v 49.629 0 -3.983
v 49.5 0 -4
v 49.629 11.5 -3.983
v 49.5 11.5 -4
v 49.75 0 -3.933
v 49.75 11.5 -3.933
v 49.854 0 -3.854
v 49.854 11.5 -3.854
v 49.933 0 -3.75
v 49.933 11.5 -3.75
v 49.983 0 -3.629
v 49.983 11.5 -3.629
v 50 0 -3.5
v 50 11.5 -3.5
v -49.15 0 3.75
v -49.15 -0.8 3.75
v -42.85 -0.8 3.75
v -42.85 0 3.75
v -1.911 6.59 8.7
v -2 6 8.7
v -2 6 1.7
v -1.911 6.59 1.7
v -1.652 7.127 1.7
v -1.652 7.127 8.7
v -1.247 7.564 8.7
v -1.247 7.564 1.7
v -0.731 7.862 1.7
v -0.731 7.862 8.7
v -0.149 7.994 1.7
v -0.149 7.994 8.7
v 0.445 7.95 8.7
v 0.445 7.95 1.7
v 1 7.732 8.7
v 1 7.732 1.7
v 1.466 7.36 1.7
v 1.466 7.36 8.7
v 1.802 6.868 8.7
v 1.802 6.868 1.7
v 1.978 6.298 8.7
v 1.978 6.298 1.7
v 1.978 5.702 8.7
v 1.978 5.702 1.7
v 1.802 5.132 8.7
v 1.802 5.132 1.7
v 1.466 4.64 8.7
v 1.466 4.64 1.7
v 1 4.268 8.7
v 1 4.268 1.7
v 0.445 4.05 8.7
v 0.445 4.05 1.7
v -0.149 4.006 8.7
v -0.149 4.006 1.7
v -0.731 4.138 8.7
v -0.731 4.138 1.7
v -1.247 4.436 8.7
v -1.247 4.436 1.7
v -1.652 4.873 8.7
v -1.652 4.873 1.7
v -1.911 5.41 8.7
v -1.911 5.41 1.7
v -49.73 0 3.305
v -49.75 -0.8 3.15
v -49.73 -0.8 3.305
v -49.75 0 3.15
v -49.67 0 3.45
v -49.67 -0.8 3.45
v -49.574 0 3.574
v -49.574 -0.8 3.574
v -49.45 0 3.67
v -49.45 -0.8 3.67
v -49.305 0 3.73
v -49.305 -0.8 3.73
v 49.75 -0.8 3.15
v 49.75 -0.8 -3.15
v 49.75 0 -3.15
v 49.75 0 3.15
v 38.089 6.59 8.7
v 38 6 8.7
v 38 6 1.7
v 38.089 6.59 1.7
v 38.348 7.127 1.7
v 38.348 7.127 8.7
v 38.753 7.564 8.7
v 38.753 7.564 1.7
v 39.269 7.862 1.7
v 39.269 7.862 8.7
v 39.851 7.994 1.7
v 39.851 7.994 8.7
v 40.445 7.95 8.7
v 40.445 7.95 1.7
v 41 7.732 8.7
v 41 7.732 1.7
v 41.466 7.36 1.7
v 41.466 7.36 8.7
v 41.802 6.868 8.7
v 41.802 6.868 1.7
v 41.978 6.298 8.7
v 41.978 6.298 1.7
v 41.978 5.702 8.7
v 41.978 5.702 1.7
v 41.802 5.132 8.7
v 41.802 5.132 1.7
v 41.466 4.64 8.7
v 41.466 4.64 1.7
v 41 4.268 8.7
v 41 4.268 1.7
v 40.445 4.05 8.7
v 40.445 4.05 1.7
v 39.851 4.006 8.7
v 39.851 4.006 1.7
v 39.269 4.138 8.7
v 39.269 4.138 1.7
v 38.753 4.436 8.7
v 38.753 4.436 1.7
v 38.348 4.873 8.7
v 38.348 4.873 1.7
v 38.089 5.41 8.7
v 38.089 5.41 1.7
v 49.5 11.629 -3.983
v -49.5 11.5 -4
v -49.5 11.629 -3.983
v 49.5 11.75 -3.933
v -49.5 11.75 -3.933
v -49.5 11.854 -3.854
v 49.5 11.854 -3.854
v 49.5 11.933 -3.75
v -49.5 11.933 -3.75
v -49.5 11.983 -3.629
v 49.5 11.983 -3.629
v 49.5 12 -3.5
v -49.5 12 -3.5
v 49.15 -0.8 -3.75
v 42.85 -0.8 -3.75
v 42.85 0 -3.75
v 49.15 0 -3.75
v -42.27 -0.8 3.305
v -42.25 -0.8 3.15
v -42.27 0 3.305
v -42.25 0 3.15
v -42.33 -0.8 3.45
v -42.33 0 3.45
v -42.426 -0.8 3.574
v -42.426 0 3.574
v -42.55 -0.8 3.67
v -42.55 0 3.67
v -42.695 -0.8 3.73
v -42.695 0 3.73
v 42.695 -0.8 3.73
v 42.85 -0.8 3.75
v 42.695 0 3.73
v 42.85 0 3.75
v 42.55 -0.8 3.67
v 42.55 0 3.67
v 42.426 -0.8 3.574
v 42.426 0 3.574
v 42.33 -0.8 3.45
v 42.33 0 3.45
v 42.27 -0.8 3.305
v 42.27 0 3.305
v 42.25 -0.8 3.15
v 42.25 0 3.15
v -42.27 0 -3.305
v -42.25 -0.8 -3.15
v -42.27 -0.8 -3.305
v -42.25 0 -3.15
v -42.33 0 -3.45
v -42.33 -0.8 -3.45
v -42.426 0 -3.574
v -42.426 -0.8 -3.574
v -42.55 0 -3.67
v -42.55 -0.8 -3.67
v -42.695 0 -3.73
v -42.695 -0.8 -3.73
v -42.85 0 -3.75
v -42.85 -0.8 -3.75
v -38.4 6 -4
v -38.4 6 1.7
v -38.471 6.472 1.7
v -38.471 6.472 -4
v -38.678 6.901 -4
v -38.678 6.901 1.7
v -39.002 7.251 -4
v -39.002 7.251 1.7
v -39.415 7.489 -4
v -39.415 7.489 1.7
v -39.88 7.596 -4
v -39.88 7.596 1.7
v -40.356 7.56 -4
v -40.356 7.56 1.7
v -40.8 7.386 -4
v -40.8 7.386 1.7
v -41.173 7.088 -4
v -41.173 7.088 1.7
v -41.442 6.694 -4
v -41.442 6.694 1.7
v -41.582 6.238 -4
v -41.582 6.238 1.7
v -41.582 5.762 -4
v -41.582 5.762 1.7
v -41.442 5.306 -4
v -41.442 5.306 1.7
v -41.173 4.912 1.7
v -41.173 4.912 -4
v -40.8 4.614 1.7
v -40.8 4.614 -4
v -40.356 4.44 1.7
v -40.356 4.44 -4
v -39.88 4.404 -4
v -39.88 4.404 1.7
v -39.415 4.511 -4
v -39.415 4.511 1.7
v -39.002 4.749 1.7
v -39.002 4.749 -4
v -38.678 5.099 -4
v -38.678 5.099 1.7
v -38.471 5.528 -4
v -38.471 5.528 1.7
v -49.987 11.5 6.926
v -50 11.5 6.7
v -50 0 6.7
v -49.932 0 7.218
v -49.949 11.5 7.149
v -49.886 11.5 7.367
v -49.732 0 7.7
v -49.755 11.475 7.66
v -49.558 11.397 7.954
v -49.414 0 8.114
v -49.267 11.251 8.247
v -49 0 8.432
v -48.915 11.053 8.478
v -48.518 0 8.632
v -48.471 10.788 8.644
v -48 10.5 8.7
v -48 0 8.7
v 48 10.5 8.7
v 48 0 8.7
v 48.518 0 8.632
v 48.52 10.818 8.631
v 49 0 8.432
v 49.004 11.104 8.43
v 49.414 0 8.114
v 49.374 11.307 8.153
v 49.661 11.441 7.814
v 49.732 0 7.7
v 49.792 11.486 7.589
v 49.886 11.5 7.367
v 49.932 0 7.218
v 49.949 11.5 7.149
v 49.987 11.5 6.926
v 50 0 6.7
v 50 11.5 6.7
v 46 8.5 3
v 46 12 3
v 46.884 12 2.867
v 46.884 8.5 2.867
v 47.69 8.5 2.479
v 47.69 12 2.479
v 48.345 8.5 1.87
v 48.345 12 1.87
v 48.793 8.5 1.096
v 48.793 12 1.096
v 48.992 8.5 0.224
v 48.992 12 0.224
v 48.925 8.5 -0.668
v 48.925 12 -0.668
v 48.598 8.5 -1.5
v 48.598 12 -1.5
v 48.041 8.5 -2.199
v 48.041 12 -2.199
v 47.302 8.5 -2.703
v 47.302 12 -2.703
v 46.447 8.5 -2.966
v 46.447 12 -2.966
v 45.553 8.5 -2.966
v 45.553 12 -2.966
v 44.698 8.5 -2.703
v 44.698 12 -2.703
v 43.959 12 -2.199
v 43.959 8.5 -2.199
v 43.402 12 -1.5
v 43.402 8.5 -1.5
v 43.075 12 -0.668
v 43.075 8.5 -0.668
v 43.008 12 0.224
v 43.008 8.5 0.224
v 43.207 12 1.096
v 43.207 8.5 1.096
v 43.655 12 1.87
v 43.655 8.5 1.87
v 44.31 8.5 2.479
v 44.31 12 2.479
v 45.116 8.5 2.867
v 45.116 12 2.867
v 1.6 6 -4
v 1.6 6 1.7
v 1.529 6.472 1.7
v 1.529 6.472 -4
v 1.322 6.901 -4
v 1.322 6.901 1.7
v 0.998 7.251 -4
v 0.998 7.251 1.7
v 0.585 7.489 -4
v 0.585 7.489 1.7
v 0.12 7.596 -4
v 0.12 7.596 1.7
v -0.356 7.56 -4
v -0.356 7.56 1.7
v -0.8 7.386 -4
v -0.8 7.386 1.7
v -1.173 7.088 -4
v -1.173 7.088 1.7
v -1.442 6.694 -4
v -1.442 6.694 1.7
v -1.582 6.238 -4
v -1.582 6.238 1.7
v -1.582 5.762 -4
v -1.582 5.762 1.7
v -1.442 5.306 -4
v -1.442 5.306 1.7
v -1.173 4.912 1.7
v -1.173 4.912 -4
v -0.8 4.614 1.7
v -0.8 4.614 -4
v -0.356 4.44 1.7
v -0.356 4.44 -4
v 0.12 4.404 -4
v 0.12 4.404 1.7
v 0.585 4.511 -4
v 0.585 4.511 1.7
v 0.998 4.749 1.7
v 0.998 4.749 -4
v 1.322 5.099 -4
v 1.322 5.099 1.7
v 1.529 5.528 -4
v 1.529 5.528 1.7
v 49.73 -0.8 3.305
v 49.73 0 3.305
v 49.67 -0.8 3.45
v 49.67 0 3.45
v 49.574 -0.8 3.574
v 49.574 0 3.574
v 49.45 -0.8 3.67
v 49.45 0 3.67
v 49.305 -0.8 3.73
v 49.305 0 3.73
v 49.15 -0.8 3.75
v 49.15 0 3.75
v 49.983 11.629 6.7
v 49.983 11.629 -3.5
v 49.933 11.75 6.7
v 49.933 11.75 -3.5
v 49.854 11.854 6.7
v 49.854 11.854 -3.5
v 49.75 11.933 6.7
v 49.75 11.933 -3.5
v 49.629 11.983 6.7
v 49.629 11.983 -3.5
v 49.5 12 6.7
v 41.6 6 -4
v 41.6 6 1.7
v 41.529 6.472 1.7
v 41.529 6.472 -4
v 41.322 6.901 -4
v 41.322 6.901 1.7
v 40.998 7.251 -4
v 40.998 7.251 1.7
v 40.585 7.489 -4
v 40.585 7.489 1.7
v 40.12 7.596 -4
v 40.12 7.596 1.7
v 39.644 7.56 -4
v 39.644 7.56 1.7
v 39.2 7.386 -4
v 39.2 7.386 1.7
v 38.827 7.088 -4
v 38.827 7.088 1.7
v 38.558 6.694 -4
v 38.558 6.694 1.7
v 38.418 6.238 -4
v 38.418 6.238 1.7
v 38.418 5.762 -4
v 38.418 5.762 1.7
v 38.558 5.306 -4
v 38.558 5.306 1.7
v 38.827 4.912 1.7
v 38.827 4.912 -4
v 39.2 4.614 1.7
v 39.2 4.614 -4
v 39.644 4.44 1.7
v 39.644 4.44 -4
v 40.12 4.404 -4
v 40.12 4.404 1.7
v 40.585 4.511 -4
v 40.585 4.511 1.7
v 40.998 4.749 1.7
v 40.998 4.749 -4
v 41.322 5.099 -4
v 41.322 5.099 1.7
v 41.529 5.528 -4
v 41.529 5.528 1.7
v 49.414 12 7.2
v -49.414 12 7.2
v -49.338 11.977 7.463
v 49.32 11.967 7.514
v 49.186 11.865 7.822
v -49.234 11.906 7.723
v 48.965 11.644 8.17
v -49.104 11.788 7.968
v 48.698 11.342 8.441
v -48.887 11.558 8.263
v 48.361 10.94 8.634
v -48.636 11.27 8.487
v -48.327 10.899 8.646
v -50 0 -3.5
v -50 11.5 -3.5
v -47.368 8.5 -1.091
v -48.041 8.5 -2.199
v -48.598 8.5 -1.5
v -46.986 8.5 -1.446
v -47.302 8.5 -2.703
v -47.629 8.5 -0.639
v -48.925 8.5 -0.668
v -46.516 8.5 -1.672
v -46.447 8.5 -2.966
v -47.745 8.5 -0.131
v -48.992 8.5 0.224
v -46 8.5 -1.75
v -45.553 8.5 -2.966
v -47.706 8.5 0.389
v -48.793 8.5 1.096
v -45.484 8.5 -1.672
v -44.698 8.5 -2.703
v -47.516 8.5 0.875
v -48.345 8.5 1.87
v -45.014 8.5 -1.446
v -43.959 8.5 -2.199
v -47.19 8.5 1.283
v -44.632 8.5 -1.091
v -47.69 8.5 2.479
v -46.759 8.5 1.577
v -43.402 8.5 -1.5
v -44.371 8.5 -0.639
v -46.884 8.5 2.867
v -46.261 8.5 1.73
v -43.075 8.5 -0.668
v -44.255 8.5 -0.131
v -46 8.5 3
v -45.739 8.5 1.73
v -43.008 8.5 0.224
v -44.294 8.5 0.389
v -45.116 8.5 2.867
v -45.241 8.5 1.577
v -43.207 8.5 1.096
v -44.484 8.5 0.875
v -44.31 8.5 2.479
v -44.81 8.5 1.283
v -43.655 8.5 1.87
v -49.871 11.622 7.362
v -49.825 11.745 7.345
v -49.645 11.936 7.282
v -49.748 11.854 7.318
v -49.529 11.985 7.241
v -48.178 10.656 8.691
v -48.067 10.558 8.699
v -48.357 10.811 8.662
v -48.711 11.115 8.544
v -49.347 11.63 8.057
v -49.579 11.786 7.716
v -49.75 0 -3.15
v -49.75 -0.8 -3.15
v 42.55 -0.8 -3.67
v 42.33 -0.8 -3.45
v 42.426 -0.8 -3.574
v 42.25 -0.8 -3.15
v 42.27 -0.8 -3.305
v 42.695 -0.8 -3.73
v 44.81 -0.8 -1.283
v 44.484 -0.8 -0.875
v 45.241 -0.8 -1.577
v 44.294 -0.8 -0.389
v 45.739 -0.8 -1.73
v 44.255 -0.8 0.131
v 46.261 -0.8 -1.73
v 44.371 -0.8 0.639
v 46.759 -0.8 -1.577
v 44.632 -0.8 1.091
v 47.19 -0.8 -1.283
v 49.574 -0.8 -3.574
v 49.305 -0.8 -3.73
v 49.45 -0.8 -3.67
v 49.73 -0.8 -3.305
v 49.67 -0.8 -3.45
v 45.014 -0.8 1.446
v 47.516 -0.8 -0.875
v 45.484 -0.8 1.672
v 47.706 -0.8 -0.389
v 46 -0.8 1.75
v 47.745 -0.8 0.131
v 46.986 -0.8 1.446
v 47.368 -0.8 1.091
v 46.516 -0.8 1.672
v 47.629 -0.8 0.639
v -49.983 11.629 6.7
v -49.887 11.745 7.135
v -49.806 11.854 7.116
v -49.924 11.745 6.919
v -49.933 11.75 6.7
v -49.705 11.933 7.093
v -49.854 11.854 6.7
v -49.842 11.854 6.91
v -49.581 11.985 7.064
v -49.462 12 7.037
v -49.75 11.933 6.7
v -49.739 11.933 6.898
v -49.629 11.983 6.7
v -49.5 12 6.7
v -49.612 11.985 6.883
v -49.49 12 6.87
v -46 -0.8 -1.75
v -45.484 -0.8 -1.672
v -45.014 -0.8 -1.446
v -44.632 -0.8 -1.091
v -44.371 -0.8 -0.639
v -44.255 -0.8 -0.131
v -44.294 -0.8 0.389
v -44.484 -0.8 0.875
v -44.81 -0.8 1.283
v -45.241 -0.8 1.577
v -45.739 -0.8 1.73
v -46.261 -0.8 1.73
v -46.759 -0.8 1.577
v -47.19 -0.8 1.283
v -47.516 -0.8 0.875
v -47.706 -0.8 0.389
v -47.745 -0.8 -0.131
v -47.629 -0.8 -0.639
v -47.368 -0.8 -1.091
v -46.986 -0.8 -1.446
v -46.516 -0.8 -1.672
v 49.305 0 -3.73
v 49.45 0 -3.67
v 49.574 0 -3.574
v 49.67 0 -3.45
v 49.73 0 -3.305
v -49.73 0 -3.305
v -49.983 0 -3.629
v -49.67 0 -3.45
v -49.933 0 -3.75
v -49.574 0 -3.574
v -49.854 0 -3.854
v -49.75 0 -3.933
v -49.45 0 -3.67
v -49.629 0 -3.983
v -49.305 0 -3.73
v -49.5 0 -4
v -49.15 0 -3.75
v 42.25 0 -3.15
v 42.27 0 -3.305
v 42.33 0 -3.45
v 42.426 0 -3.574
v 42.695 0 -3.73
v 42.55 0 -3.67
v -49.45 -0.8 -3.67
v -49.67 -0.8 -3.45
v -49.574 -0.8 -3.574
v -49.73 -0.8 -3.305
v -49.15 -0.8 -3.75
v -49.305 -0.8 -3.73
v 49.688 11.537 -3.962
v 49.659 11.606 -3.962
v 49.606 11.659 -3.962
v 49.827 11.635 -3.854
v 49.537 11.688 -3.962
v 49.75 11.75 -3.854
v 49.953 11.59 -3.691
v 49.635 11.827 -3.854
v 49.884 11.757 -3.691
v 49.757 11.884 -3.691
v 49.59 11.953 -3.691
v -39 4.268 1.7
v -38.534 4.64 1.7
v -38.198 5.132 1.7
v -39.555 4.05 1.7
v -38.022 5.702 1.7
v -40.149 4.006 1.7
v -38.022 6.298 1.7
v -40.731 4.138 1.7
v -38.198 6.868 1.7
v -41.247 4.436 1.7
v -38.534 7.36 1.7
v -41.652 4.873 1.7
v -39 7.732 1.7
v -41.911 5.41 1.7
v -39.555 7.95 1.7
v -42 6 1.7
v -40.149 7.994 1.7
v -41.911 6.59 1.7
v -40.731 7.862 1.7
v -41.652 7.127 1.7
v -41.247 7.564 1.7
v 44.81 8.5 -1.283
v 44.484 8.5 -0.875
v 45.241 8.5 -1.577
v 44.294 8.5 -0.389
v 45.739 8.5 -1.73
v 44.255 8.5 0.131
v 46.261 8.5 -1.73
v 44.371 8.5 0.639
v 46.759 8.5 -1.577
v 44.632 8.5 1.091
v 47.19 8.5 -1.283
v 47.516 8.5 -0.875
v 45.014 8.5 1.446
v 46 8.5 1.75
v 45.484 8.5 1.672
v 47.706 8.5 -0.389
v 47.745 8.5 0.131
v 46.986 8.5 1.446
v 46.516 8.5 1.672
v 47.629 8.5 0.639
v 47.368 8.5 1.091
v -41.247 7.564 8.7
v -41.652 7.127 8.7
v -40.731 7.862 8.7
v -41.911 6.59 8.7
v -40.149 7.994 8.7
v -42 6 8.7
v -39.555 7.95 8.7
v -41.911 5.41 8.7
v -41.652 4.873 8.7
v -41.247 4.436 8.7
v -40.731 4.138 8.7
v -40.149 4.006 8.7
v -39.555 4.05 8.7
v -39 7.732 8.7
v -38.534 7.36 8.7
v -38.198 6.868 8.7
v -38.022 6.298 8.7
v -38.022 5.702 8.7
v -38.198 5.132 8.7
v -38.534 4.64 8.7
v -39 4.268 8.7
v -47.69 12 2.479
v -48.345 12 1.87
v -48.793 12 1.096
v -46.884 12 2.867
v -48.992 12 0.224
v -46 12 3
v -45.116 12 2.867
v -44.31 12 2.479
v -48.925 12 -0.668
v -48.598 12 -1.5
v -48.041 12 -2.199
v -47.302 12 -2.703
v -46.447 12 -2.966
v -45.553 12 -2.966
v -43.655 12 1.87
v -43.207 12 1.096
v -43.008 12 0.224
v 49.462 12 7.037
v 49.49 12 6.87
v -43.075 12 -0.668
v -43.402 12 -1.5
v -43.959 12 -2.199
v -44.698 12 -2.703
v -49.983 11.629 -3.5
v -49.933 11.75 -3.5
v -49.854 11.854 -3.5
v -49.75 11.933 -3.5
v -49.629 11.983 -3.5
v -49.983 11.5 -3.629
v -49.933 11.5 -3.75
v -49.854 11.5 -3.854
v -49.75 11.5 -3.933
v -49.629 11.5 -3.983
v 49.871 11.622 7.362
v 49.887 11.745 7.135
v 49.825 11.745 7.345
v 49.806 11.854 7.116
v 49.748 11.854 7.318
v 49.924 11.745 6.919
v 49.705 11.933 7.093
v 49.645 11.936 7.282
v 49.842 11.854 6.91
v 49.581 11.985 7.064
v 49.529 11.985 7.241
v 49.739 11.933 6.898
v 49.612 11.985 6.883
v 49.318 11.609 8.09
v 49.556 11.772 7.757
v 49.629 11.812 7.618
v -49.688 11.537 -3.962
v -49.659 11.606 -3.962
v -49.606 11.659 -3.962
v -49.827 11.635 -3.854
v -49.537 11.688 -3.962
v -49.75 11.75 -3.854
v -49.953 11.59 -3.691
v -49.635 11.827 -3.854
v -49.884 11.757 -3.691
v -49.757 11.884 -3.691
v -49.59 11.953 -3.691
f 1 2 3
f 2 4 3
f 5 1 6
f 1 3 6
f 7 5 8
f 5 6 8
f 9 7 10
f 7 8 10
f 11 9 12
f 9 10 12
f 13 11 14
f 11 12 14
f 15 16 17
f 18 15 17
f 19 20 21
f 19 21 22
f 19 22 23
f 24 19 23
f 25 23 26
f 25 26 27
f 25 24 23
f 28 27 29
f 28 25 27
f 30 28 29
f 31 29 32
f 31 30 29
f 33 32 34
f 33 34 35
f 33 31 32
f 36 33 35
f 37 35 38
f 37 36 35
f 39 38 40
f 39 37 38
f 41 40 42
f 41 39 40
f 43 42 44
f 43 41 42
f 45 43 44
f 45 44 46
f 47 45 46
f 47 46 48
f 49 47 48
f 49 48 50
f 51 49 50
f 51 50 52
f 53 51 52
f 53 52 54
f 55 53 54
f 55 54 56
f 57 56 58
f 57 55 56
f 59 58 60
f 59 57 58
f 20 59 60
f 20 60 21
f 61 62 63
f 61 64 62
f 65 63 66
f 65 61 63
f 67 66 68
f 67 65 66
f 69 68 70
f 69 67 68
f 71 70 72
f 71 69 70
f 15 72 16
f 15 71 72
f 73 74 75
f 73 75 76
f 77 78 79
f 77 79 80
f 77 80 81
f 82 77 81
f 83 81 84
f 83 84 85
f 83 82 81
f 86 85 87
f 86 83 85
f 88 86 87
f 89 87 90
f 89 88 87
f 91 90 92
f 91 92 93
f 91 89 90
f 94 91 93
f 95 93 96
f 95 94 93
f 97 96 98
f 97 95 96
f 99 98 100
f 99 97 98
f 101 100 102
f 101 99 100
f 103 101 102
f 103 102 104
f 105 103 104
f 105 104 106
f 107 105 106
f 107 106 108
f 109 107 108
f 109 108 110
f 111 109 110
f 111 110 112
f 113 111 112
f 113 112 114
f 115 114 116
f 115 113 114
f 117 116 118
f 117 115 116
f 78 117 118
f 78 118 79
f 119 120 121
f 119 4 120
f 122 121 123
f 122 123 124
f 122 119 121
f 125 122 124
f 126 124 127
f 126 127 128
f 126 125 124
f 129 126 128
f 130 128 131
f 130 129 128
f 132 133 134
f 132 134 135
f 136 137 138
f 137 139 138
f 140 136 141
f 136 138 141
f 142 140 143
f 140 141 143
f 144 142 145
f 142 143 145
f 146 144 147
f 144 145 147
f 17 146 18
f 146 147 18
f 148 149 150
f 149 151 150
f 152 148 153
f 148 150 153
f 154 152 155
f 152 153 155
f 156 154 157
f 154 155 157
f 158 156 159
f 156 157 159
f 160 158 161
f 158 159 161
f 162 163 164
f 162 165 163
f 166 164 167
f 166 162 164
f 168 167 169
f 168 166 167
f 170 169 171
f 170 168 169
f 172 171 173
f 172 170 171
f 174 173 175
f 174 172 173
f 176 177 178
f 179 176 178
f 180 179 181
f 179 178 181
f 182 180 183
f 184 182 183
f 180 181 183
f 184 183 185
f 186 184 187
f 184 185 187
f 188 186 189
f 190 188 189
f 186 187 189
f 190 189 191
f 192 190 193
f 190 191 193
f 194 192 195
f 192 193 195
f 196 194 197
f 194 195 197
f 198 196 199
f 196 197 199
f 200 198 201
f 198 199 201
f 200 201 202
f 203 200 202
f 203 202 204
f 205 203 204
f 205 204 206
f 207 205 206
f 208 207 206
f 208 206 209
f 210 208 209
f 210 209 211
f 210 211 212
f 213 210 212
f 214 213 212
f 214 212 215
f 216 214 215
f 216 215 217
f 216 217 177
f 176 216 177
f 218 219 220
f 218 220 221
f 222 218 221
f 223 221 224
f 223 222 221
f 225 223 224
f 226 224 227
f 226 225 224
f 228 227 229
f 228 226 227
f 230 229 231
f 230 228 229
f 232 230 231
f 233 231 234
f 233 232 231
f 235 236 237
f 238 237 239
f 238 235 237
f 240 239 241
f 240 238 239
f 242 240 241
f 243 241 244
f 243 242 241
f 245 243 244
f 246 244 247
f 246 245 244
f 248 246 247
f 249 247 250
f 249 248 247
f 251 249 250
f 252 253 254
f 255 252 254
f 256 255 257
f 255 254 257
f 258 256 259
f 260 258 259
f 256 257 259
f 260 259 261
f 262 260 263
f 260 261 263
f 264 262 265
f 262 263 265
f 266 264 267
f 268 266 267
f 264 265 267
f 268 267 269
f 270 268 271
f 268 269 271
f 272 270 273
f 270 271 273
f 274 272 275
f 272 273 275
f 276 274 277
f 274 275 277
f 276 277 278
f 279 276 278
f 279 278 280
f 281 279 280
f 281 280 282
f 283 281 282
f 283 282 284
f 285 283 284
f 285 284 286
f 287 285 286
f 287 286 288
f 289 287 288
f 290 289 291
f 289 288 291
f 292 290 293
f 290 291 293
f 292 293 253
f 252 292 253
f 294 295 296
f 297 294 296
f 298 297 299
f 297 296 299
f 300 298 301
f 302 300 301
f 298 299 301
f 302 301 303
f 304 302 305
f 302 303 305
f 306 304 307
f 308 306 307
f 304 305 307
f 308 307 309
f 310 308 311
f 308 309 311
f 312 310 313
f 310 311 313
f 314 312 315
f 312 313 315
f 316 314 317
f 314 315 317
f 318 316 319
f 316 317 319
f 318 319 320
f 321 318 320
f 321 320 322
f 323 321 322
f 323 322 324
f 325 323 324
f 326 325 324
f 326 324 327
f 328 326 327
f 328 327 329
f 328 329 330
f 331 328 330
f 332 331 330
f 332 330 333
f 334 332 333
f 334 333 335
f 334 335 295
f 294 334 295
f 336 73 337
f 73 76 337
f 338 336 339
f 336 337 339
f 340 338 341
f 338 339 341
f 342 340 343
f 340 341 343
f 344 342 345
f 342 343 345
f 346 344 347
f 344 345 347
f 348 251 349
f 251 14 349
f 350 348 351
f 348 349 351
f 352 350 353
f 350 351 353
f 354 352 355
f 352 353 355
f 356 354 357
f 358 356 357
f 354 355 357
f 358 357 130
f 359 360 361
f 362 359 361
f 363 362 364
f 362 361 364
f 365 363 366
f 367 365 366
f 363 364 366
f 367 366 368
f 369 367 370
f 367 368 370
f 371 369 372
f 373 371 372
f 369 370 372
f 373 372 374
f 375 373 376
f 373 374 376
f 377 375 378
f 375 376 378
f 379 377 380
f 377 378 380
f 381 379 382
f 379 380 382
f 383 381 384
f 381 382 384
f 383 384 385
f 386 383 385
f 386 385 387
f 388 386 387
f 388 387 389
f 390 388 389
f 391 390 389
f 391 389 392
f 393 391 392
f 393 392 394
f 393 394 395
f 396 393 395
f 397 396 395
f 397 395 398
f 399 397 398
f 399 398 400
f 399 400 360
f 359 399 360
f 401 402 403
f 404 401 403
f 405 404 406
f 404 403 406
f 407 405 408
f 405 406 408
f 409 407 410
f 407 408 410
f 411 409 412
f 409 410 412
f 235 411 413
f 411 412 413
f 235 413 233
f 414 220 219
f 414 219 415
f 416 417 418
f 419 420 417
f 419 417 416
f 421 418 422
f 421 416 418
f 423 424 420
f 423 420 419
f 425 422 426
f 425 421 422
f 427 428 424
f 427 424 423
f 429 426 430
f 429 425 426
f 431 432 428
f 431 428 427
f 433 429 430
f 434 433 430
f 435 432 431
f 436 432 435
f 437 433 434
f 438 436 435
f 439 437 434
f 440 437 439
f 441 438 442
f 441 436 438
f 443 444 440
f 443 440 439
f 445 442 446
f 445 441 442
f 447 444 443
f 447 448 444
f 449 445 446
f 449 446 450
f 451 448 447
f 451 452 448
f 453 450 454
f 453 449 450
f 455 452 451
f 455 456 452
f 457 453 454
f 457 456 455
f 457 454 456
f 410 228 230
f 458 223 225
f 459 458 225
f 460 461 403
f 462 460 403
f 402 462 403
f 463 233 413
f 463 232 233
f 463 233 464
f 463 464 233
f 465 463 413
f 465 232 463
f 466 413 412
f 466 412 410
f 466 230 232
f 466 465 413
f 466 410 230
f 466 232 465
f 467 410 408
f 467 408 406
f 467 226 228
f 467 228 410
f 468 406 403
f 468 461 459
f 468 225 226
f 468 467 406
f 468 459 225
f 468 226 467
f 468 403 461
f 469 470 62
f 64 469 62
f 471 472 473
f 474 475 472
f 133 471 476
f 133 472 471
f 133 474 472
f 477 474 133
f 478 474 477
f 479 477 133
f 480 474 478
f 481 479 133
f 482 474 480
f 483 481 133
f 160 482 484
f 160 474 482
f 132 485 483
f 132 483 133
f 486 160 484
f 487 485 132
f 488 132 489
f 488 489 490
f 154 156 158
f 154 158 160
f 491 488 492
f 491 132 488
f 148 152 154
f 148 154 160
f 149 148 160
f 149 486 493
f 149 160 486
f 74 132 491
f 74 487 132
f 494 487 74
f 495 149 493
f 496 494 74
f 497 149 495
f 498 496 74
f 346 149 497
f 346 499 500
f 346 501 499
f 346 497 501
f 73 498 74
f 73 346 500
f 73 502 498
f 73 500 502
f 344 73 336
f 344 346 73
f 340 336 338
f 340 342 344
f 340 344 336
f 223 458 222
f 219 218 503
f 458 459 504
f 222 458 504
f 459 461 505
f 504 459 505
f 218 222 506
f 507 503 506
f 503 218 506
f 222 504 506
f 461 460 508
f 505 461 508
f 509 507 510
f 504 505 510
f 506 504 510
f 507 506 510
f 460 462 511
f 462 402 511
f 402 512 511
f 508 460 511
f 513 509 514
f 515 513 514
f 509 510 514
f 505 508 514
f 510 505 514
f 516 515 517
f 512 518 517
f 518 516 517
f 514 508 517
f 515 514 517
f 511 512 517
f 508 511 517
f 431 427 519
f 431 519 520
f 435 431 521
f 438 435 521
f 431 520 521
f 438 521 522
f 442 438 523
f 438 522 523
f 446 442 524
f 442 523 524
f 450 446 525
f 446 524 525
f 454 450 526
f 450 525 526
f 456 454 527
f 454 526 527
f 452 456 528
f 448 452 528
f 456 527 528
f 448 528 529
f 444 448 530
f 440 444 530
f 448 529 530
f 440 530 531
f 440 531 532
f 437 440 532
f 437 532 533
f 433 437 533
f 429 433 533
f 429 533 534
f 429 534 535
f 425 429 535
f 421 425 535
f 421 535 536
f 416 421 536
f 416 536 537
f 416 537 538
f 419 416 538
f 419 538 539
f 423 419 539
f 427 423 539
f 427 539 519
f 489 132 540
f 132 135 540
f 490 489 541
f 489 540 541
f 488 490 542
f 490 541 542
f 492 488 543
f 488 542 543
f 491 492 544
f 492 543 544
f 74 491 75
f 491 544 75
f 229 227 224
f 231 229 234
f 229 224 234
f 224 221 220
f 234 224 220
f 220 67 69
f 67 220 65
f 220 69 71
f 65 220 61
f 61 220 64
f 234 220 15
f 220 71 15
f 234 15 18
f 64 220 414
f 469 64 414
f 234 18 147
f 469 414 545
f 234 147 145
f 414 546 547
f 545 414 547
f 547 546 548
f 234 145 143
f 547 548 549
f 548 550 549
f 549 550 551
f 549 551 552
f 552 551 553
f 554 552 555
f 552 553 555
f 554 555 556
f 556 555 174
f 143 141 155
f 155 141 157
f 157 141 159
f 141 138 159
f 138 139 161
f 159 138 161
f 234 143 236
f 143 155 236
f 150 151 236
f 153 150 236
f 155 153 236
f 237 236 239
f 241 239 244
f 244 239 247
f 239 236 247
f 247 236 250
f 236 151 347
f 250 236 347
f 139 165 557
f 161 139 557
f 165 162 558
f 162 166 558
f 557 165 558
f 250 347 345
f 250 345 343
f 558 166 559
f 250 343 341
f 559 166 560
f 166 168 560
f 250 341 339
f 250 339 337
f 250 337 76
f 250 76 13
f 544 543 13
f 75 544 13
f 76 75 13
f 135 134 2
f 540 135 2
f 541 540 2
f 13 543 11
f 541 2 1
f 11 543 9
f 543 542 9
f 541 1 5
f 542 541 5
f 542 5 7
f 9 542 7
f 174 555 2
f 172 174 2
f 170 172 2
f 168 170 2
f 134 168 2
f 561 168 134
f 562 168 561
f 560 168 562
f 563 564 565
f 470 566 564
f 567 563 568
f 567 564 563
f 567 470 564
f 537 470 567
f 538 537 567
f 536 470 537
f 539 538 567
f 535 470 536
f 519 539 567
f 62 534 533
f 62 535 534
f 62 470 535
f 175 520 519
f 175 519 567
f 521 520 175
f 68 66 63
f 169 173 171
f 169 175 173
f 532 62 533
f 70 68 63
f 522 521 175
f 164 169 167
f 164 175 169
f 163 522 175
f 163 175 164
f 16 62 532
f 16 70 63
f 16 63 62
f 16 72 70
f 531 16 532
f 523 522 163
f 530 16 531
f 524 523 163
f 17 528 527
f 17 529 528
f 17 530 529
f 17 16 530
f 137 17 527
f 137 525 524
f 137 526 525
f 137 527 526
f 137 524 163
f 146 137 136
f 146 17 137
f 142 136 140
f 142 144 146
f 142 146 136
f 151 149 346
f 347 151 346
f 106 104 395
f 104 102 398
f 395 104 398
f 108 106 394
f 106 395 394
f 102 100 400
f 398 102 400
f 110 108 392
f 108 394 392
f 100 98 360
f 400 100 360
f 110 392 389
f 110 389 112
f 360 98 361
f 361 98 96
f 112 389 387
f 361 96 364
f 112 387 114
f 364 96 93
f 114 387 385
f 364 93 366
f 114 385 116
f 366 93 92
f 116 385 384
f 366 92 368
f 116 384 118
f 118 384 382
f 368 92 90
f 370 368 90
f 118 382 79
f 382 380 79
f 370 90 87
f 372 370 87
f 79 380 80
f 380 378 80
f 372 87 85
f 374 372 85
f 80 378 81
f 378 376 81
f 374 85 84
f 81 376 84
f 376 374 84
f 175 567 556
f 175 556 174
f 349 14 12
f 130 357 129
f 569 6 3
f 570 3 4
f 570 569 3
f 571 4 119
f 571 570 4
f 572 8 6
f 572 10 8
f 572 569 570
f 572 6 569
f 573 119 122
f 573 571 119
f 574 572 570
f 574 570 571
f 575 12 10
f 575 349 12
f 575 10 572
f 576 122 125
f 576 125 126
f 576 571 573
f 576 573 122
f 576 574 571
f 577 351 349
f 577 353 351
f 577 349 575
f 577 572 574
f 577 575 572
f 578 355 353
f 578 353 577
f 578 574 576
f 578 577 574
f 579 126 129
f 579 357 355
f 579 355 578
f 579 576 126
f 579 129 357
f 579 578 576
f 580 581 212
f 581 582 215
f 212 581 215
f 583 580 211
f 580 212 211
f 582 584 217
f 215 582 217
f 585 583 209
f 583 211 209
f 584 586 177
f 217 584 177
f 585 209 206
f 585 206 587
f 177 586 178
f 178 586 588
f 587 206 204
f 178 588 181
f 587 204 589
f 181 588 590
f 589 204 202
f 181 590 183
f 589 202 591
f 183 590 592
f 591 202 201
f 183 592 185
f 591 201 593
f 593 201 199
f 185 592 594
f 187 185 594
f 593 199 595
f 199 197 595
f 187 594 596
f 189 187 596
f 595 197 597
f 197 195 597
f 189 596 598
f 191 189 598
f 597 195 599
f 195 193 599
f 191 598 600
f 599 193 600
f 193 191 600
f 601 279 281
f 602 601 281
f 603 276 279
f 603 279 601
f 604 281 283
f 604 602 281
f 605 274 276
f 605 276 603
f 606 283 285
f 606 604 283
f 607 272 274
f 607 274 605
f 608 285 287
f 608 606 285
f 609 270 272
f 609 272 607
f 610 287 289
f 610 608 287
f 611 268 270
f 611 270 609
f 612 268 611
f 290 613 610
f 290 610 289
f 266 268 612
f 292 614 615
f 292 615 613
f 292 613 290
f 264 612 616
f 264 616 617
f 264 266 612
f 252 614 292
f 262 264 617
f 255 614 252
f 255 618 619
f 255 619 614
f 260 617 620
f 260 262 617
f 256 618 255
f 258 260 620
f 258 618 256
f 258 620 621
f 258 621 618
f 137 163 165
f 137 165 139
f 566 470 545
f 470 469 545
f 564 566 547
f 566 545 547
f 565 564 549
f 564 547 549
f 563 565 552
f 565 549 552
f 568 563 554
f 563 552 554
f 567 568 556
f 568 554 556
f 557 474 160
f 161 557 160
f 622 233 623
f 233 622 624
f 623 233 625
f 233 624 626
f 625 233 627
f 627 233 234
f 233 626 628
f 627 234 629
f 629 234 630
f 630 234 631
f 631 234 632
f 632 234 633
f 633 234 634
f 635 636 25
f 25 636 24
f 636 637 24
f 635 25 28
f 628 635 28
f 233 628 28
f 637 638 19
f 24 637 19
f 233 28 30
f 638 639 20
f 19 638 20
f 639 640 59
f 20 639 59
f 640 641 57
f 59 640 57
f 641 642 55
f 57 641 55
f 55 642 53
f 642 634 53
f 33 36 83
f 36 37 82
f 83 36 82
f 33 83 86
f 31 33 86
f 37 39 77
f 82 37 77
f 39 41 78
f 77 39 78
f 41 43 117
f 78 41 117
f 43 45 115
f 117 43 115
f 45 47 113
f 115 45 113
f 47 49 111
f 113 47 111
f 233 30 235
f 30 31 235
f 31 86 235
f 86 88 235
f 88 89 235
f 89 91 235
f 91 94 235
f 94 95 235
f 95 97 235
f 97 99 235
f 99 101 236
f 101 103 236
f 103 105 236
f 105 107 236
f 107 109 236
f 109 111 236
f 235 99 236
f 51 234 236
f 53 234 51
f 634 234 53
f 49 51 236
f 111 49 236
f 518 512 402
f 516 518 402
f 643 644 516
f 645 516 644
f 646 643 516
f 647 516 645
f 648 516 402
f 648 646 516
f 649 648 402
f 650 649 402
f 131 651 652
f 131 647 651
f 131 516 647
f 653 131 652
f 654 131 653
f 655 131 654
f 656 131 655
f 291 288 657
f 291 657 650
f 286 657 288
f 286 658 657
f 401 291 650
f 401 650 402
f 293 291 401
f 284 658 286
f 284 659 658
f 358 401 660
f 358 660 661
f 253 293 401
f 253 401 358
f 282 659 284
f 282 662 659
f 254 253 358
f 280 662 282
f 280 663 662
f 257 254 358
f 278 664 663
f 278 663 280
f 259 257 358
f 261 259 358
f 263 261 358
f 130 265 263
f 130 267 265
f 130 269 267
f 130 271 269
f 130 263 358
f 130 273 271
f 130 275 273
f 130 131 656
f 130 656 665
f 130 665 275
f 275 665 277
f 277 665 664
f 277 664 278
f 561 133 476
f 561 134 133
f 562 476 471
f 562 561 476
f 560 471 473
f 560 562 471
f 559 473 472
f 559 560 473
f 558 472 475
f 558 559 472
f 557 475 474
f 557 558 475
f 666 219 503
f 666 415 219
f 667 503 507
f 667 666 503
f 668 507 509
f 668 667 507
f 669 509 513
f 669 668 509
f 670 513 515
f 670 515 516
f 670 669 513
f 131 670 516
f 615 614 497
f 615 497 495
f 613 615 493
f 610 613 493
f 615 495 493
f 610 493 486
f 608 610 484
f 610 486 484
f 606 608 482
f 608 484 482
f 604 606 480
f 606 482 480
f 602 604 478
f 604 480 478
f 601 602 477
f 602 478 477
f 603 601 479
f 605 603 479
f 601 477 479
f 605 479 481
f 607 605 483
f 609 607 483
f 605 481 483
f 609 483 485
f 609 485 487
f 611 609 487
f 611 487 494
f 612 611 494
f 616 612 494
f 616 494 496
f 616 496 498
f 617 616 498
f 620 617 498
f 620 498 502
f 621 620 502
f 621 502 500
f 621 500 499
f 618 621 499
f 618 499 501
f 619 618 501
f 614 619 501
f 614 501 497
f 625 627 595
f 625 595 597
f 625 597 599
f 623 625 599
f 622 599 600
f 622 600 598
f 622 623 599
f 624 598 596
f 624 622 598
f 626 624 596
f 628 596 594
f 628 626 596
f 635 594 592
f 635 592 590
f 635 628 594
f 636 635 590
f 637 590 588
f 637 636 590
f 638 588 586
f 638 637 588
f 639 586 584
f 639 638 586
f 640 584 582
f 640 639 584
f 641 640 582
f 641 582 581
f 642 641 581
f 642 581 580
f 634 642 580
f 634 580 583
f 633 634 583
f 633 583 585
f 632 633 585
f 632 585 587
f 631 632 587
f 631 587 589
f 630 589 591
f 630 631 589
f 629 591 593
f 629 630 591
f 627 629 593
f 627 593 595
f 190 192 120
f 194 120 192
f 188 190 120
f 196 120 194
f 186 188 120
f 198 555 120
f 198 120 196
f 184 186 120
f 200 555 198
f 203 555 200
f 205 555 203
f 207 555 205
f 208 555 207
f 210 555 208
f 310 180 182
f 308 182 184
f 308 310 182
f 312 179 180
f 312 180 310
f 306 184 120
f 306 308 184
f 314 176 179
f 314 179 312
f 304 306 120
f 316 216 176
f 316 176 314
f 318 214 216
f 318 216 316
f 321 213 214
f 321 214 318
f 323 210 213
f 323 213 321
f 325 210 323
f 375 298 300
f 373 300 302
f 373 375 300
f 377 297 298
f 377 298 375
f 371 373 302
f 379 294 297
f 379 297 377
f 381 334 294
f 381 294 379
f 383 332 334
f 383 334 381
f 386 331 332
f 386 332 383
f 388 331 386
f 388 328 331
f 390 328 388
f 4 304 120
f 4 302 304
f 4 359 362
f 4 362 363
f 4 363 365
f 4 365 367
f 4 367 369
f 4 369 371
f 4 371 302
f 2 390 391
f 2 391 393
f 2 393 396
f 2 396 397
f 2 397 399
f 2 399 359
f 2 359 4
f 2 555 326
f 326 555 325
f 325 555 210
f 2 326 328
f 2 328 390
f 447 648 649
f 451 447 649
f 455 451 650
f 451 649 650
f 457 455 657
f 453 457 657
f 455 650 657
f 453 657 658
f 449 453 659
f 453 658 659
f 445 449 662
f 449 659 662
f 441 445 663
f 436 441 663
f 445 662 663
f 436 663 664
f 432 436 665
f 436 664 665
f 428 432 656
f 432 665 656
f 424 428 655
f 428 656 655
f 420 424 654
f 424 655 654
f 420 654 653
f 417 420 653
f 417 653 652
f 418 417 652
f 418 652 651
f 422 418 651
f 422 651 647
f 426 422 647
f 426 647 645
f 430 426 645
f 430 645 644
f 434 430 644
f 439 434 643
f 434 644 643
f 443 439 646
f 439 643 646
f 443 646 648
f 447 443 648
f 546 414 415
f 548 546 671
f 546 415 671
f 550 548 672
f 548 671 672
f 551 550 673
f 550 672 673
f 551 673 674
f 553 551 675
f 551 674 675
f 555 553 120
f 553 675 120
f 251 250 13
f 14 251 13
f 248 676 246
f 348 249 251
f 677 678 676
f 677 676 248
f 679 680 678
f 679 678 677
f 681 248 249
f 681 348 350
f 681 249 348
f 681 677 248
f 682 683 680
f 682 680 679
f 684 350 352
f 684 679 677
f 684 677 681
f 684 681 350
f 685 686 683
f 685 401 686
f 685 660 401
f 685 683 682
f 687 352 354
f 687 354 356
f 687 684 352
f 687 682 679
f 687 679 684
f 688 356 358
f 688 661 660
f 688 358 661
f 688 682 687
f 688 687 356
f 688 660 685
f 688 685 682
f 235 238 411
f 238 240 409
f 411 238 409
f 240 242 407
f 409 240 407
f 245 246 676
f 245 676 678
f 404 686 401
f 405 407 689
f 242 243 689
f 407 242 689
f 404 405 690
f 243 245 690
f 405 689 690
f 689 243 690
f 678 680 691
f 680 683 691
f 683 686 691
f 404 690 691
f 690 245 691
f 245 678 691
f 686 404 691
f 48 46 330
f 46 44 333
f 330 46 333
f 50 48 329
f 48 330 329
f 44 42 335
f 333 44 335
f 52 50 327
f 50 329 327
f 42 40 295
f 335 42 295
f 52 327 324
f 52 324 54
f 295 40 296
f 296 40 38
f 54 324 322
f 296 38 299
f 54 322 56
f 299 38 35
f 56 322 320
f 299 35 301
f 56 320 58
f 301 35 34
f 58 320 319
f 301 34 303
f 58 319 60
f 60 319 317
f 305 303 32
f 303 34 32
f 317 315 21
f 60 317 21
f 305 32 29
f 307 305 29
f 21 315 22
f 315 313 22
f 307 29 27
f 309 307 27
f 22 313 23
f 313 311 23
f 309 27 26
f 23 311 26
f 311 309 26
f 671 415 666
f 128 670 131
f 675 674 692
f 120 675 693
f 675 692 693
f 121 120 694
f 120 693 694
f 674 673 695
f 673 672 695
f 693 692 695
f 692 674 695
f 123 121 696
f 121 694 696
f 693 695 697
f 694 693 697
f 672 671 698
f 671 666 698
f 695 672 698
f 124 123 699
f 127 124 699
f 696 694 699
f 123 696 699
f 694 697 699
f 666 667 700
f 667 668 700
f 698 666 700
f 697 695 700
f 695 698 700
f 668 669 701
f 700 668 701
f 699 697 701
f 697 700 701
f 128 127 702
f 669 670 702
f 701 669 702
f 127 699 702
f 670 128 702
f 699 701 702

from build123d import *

# Parameters (mm, degrees)
SKETCH1_W           = 100
SKETCH1_H           = 12.7
SKETCH1_R           = 1.75
BOSS_EXTRUDE1_DEPTH = 12
SKETCH2_R           = 3
CUT_EXTRUDE1_DEPTH  = 3.5
SKETCH3_R           = 1.6
CUT_EXTRUDE2_DEPTH  = 50
SKETCH4_R           = 2
CUT_EXTRUDE3_DEPTH  = 7
FILLET1_R           = 2
FILLET2_R           = 1.5
BOSS_EXTRUDE2_START = 0.8
SKETCH5_W           = 7.5
SKETCH5_H           = 7.5
SKETCH5_R           = 1.75
BOSS_EXTRUDE2_DEPTH = 0.8
FILLET3_R           = 0.6
FILLET4_R           = 0.5


with BuildPart() as part:
    # Sketch1 → Boss-Extrude1 (new body)
    with BuildSketch(Plane(origin=(0, 0, 0), x_dir=(1, 0, 0), z_dir=(0, 1, 0))):
        with Locations((0, -2.35)):
            Rectangle(SKETCH1_W, SKETCH1_H)
        with Locations(Location((46, 0, 0), (0, 0, 270))):
            Circle(SKETCH1_R, mode=Mode.SUBTRACT)
        with Locations(Location((-46, 0, 0), (0, 0, 90))):
            Circle(SKETCH1_R, mode=Mode.SUBTRACT)
    extrude(amount=BOSS_EXTRUDE1_DEPTH)

    # Sketch2 → Cut-Extrude1 (cut)
    with BuildSketch(Plane(origin=(0, 12, 0), x_dir=(1, 0, 0), z_dir=(0, 1, 0))):
        with Locations(Location((46, 0, 0), (0, 0, 270))):
            Circle(SKETCH2_R)
        with Locations(Location((-46, 0, 0), (0, 0, 270))):
            Circle(SKETCH2_R)
    extrude(amount=-CUT_EXTRUDE1_DEPTH, mode=Mode.SUBTRACT)

    # Sketch3 → Cut-Extrude2 (cut)
    with BuildSketch(Plane.XY.offset(8.7)):
        with Locations((40, 6)):
            Circle(SKETCH3_R)
        with Locations((0, 6)):
            Circle(SKETCH3_R)
        with Locations((-40, 6)):
            Circle(SKETCH3_R)
    extrude(amount=-CUT_EXTRUDE2_DEPTH, mode=Mode.SUBTRACT)

    # Sketch4 → Cut-Extrude3 (cut)
    with BuildSketch(Plane(origin=(0, 0, 8.7), x_dir=(-1, 0, 0), z_dir=(0, 0, -1))):
        with Locations((40, 6)):
            Circle(SKETCH4_R)
        with Locations((0, 6)):
            Circle(SKETCH4_R)
        with Locations((-40, 6)):
            Circle(SKETCH4_R)
    extrude(amount=CUT_EXTRUDE3_DEPTH, mode=Mode.SUBTRACT)

    # Fillet1
    fillet1_edges = [part.edges().sort_by_distance(p)[0] for p in [
        (50, 6, 8.7),
        (-50, 6, 8.7),
    ]]
    fillet(fillet1_edges, radius=FILLET1_R)

    # Fillet2
    # the kernel refuses this fillet: 1.5 mm, written as the material it takes off along each edge
    with BuildSketch(Plane(origin=(-51.75, 12, 8.7), x_dir=(0, -1, 0), z_dir=(1, 0, 0))) as fillet2_piece_1:
        with BuildLine():
            CenterArc((FILLET2_R, FILLET2_R), FILLET2_R, 180, 90)
            Line((0, FILLET2_R), (0, 0))
            Line((0, 0), (FILLET2_R, 0))
        make_face()
    extrude(amount=103.5, mode=Mode.SUBTRACT)

    # Sketch5 → Boss-Extrude2 (add)
    # profile 1 of 2: a face of its own
    with BuildSketch(Plane.XZ.offset(BOSS_EXTRUDE2_START)):
        with Locations((-46, 0)):
            Rectangle(SKETCH5_W, SKETCH5_H)
        with Locations(Location((-46, 0, 0), (0, 0, 270))):
            Circle(SKETCH5_R, mode=Mode.SUBTRACT)
    # profile 2 of 2: a face of its own
    with BuildSketch(Plane.XZ.offset(BOSS_EXTRUDE2_START)):
        with Locations((46, 0)):
            Rectangle(SKETCH5_W, SKETCH5_H)
        with Locations(Location((46, 0, 0), (0, 0, 90))):
            Circle(SKETCH5_R, mode=Mode.SUBTRACT)
    extrude(amount=-BOSS_EXTRUDE2_DEPTH)

    # Fillet3
    fillet3_edges = [part.edges().sort_by_distance(p)[0] for p in [
        (42.25, -0.4, 3.75),
        (42.25, -0.4, -3.75),
        (49.75, -0.4, -3.75),
        (49.75, -0.4, 3.75),
        (-49.75, -0.4, 3.75),
        (-49.75, -0.4, -3.75),
        (-42.25, -0.4, -3.75),
        (-42.25, -0.4, 3.75),
    ]]
    fillet(fillet3_edges, radius=FILLET3_R)

    # Fillet4
    fillet4_edges = [part.edges().sort_by_distance(p)[0] for p in [
        (-50, 12, 1.35),
        (50, 12, 1.35),
        (-49.984059393, 12, 6.952008585),
        (-50, 6, -4),
        (50, 6, -4),
        (49.984059393, 12, 6.952008585),
        (49.135184903, 11.467090552, 8.346619324),
        (-49.135184903, 11.467090552, 8.346619324),
        (0, 12, -4),
    ]]
    fillet(fillet4_edges, radius=FILLET4_R)


solid = part.part
